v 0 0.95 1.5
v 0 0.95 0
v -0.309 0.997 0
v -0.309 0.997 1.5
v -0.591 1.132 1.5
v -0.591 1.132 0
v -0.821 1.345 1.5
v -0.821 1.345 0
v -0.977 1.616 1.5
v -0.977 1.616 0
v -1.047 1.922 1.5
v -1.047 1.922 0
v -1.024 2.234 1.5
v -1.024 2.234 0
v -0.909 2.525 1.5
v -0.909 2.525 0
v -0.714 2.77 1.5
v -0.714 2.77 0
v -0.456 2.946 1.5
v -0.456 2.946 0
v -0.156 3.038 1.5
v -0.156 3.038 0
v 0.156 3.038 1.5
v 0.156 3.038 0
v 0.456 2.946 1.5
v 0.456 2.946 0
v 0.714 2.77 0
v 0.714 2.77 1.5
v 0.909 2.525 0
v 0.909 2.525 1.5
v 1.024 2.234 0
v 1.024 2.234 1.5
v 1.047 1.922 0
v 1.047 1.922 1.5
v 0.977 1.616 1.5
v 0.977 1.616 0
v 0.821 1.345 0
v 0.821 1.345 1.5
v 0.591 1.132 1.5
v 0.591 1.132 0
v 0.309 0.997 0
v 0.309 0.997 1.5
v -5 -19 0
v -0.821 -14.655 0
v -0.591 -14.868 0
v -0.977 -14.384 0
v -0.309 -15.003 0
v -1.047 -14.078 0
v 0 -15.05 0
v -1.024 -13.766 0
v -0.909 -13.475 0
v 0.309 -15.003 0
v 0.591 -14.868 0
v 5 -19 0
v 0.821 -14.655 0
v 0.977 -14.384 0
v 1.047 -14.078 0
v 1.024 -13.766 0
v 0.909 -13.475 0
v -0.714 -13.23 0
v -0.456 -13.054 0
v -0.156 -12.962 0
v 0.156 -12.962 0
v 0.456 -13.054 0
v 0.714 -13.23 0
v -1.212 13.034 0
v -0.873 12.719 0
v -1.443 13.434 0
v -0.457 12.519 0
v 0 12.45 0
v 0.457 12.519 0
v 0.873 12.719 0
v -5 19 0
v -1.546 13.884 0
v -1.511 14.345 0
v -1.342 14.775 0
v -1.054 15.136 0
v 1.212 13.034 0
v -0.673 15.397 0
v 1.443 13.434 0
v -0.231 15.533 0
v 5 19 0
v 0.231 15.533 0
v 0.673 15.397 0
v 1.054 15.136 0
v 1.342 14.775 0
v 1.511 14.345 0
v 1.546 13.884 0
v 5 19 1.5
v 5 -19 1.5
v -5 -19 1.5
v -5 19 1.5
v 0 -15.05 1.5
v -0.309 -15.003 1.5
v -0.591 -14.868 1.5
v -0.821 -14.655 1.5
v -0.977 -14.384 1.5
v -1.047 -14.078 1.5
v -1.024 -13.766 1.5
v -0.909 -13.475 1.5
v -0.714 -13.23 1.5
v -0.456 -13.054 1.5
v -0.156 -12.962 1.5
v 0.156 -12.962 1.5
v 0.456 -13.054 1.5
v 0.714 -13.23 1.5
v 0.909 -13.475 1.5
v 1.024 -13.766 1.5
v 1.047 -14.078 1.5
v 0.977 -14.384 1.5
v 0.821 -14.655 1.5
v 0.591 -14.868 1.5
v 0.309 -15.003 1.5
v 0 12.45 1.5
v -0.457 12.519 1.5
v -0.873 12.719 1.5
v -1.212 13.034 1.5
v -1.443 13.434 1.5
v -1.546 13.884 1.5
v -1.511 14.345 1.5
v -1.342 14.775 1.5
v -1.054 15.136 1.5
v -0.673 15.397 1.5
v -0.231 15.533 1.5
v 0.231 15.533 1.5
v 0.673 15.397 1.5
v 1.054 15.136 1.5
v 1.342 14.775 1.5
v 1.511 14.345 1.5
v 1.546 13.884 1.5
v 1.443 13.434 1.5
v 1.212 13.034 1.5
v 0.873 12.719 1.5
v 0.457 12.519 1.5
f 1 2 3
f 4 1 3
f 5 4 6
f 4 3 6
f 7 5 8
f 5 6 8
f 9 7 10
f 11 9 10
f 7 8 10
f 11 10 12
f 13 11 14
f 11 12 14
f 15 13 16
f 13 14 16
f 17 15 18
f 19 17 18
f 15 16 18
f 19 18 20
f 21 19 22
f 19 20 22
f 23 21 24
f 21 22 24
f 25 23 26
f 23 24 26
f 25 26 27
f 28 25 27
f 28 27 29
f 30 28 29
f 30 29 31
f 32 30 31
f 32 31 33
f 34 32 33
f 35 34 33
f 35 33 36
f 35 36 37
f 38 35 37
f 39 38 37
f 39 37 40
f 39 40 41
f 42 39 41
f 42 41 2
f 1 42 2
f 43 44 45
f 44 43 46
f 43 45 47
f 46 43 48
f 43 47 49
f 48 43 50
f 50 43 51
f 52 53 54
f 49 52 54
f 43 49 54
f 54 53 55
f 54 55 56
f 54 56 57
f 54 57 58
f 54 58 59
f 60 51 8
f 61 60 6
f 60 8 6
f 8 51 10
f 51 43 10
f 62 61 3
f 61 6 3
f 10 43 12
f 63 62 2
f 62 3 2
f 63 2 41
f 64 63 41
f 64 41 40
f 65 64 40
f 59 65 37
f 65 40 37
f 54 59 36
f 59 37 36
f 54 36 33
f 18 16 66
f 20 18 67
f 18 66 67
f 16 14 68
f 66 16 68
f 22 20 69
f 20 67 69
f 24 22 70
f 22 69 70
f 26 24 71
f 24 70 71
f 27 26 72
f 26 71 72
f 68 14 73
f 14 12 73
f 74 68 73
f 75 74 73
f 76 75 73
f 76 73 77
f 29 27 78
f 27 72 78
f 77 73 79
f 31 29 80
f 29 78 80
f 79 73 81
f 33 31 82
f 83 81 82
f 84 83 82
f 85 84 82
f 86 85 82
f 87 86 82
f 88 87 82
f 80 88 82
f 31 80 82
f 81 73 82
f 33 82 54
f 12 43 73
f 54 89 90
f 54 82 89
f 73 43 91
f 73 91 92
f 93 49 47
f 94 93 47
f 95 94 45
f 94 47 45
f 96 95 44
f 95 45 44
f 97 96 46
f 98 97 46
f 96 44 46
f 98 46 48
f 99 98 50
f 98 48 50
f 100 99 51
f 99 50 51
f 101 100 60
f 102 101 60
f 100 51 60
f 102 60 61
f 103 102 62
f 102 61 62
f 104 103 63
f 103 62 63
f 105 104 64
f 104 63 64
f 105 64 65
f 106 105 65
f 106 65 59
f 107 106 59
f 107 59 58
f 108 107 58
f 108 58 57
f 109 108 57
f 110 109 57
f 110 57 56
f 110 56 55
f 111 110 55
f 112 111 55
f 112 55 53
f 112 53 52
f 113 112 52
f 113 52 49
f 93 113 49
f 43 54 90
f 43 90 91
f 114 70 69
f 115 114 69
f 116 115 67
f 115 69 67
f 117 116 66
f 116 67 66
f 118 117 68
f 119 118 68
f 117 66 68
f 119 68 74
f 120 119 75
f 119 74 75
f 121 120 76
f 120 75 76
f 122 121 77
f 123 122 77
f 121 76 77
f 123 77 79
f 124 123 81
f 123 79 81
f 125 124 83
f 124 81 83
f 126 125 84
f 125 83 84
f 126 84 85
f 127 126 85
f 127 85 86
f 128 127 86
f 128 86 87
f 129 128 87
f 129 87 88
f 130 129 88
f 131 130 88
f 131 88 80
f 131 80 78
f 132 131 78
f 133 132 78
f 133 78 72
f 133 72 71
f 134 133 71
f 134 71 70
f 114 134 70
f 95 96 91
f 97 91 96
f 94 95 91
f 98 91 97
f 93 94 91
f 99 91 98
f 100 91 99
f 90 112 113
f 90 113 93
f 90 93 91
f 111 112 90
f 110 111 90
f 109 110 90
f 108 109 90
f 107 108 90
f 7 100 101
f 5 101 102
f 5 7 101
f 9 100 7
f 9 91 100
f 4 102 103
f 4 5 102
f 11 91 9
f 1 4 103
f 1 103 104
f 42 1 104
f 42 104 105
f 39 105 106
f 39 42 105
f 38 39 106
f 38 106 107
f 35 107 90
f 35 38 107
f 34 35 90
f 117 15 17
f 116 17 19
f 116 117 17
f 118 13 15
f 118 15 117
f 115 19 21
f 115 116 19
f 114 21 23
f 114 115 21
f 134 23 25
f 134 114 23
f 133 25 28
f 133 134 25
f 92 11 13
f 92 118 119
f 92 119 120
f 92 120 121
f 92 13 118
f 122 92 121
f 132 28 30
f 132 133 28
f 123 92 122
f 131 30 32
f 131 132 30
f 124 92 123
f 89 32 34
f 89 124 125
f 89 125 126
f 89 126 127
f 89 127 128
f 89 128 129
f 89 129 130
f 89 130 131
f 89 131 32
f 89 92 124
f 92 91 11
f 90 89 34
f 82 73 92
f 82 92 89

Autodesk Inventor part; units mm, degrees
ref_plane "YZ Plane" through (0, 0, 0) normal (1, 0, 0) x (0, 1, 0)
ref_plane "XZ Plane" through (0, 0, 0) normal (0, 1, 0) x (-1, 0, 0)
ref_plane "XY Plane" through (0, 0, 0) normal (0, 0, 1) x (1, 0, 0)
sketch "スケッチ1" plane through (0, 0, 0) normal (0, 0, 1) x (1, 0, 0)
  line L0 (-5, 19) -> (5, 19)
  line L1 (5, 19) -> (5, -19)
  line L2 (5, -19) -> (-5, -19)
  line L3 (-5, -19) -> (-5, 19)
  line L4 (-5, 19) -> (5, -19) construction
  line L5 (5, 19) -> (-5, -19) construction
  point P0 (0, 0)
  dimension "d0" = 10
  dimension "d1" = 38
extrude "押し出し1" add sketch "スケッチ1" along normal blind 1.5
sketch "スケッチ2" plane through (0, 0, 1.5) normal (0, 0, 1) x (1, 0, 0)
  line L0 (5, 19) -> (-5, 19) projected
  line L1 (5, -19) -> (5, 19) projected
  line L2 (-5, -19) -> (5, -19) projected
  point P0 (0, 0)
  point P1 (0, -14)
  point P2 (0, 2)
  dimension "d6" = 5
  dimension "d7" = 5
  dimension "d8" = 16
hole "穴1" at (0, -14, 1.5) at (0, 2, 1.5) direction (0, 0, -1) diameter 2.1 end through all
sketch "スケッチ3" plane through (0, 0, 1.5) normal (0, 0, 1) x (1, 0, 0)
  line L0 (5, 19) -> (-5, 19) projected
  line L1 (5, -19) -> (5, 19) projected
  point P0 (0, 0)
  point P1 (0, 14)
  dimension "d16" = 5
  dimension "d17" = 5
hole "穴2" at (0, 14, 1.5) direction (0, 0, -1) diameter 3.1 end through all
properties part number "servo catch front c"
